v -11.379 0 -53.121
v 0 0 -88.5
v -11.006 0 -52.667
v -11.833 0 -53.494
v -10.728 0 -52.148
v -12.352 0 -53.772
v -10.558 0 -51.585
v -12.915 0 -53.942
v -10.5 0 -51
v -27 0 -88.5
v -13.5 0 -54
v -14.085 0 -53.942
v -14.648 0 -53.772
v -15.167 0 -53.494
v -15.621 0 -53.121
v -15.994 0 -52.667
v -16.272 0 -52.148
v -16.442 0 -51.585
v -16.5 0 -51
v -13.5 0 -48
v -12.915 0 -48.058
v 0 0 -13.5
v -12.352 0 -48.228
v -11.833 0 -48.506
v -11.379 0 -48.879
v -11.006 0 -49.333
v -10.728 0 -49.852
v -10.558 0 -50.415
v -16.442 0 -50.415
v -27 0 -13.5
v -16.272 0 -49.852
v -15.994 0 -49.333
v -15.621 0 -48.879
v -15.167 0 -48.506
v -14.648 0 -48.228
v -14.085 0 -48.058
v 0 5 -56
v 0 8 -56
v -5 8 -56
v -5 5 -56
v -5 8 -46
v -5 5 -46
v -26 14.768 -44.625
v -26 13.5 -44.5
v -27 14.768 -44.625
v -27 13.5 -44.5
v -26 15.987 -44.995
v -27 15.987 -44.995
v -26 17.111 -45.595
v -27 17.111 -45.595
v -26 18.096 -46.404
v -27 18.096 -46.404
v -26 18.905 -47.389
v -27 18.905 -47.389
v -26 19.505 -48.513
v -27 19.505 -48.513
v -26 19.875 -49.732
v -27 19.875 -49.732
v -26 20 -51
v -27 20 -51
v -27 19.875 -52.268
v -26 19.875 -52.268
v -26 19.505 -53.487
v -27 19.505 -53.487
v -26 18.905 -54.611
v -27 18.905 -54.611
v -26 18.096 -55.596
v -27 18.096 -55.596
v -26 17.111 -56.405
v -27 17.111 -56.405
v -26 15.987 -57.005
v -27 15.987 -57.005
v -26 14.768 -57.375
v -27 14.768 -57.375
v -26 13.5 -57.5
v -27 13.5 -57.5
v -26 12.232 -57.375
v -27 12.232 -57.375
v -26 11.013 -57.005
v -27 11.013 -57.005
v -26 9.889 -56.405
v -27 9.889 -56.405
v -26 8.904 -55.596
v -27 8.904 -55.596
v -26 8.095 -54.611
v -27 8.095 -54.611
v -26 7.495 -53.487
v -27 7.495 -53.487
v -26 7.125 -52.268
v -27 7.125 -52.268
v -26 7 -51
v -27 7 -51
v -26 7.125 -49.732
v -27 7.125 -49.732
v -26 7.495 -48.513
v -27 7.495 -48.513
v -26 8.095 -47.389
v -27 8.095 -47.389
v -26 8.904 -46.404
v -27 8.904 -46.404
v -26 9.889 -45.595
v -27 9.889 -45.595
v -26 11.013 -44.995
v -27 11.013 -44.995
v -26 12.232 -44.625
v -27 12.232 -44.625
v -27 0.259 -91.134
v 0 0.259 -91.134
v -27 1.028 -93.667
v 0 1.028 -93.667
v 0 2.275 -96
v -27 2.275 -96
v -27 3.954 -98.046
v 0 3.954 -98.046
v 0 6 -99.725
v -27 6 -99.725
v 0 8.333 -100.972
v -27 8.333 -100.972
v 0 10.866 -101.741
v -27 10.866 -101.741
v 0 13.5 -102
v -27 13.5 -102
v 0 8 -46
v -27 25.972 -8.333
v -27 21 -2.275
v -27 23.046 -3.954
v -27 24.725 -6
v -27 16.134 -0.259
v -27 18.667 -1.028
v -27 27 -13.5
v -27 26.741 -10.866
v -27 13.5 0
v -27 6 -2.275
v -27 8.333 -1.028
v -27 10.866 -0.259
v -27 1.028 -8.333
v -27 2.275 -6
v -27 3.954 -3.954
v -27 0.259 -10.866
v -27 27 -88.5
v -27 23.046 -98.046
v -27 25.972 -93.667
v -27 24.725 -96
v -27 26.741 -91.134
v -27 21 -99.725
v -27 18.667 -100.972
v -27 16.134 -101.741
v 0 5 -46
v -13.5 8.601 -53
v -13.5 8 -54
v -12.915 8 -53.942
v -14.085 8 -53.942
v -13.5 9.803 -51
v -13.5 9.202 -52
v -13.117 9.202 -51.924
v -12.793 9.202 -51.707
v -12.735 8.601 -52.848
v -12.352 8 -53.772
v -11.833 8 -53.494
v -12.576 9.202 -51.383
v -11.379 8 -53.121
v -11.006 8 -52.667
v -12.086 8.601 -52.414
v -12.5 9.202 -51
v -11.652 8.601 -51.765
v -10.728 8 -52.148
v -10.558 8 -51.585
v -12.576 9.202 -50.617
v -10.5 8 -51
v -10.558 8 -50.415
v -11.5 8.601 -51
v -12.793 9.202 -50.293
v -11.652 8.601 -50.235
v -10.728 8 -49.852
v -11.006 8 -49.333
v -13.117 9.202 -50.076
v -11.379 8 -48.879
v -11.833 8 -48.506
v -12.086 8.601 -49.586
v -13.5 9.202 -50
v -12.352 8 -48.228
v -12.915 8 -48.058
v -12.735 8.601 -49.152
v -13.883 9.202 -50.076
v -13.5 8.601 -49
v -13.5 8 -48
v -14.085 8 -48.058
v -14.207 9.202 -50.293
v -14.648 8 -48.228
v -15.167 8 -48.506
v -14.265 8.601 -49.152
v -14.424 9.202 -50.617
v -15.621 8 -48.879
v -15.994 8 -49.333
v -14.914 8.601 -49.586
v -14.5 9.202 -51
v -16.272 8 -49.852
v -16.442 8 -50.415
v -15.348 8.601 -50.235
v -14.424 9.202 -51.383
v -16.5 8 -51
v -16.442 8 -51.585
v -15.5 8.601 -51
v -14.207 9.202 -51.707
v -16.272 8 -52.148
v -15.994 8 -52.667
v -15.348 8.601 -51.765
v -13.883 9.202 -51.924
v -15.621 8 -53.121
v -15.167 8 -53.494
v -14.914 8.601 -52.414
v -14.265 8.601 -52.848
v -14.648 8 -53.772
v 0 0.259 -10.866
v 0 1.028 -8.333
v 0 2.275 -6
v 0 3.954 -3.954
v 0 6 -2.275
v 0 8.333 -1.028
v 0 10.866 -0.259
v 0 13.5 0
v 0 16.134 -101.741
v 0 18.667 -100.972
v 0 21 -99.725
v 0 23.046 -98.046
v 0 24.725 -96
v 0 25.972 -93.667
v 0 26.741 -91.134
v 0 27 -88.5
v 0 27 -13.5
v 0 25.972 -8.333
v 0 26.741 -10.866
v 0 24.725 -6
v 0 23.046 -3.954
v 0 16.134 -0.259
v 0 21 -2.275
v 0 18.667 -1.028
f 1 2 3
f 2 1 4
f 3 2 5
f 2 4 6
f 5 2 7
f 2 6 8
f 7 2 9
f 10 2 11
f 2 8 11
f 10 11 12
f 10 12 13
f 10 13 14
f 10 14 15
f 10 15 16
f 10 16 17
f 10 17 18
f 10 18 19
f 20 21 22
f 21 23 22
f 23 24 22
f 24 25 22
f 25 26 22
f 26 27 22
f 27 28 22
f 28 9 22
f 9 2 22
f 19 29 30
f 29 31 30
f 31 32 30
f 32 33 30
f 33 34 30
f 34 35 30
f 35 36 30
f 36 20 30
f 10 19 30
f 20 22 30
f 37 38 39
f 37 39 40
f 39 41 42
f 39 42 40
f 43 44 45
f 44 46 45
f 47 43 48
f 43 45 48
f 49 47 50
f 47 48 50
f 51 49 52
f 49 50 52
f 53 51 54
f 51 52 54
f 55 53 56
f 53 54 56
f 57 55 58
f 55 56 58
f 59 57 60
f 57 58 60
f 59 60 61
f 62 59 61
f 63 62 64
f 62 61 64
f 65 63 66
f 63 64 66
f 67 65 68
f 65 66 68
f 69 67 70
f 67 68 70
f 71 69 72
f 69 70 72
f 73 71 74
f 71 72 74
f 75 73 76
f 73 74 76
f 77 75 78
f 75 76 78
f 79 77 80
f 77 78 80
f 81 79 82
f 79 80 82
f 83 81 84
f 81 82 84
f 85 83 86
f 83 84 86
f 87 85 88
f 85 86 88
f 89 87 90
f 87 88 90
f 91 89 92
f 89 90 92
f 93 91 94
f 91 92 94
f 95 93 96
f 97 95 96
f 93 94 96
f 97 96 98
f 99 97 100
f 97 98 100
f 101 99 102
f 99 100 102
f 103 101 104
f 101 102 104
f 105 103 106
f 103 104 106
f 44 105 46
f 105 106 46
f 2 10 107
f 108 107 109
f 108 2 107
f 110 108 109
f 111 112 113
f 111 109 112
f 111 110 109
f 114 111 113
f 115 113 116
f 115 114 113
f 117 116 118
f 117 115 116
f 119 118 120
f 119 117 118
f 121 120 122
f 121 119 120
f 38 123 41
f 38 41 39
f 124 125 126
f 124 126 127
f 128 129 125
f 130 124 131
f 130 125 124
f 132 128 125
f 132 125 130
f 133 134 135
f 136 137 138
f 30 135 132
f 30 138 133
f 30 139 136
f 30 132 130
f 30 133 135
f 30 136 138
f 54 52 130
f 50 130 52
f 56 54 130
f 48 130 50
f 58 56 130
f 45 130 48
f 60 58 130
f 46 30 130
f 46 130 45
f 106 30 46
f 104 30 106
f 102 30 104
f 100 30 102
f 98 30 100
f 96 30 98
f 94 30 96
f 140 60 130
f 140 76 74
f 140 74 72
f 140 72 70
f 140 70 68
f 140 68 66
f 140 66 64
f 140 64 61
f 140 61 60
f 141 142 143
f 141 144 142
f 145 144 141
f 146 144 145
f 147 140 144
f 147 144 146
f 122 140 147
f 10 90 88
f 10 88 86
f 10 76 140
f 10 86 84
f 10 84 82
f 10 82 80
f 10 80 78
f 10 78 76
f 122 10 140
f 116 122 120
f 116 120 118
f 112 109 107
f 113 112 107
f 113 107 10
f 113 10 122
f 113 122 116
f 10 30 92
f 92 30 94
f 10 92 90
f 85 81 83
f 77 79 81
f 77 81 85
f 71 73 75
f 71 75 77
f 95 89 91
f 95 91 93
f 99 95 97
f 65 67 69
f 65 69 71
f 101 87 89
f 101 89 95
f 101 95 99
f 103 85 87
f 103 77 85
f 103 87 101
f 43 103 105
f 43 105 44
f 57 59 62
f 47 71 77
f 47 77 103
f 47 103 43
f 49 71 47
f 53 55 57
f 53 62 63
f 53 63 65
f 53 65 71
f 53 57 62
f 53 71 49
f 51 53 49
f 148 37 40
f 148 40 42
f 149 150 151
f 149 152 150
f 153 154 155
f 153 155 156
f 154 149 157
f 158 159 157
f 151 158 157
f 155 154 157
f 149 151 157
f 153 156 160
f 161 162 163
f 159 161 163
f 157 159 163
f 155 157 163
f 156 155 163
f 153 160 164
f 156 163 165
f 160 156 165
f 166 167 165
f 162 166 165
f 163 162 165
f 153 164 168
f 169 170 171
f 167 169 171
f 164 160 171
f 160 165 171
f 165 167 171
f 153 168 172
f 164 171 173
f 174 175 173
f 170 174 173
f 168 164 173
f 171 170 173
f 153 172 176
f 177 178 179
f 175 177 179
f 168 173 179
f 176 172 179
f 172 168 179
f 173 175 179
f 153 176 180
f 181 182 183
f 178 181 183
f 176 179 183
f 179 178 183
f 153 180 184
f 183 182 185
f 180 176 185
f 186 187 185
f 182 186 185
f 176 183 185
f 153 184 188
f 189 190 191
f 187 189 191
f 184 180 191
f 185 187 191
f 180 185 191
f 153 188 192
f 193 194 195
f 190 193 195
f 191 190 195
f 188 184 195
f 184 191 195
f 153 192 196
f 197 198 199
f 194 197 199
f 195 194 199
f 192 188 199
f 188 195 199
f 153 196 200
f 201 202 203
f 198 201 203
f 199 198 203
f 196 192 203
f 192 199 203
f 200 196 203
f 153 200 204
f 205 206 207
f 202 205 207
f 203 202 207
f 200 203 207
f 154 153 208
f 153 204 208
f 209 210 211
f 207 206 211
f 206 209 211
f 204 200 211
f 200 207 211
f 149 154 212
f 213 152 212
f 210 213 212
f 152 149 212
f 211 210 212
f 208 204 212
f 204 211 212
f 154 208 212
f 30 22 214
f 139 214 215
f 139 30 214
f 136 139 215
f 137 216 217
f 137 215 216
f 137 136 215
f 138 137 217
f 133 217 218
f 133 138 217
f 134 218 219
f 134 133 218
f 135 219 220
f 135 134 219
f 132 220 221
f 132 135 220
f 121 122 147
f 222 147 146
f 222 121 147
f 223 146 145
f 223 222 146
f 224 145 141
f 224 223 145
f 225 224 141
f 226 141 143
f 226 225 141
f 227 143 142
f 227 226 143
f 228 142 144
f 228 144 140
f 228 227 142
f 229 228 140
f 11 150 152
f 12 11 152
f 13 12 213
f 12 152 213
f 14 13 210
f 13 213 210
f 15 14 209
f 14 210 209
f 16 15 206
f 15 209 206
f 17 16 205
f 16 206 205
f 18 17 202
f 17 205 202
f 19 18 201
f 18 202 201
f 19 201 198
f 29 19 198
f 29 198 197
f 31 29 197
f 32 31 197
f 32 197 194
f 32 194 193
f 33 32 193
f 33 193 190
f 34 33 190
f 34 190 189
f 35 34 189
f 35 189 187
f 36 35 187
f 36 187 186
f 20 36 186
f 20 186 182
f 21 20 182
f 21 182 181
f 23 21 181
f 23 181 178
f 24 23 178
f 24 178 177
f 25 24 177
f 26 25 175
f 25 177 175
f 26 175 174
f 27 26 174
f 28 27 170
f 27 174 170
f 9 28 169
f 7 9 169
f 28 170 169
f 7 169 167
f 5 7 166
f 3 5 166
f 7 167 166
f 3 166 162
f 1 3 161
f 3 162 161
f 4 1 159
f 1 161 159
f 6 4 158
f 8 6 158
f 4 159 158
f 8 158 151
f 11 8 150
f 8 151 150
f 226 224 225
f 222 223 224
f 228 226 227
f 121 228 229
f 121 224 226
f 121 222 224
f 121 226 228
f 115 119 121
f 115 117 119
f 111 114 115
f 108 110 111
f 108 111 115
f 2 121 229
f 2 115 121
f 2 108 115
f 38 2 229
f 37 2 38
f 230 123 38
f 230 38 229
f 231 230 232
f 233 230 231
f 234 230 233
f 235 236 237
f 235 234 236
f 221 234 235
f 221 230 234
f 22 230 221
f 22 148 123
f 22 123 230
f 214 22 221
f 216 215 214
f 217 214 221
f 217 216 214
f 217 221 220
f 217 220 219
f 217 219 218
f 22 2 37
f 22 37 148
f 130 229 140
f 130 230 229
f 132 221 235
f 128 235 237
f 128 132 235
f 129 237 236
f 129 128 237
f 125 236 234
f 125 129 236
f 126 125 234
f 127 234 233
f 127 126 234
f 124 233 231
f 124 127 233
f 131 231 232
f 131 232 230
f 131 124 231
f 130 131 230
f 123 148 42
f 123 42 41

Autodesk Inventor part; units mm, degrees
ref_plane "YZ Plane" through (0, 0, 0) normal (1, 0, 0) x (0, 1, 0)
ref_plane "XZ Plane" through (0, 0, 0) normal (0, 1, 0) x (-1, 0, 0)
ref_plane "XY Plane" through (0, 0, 0) normal (0, 0, 1) x (1, 0, 0)
sketch "スケッチ1" plane through (0, 0, 0) normal (0, 1, 0) x (-1, 0, 0)
  line L0 (0, 0) -> (27, 0)
  line L1 (27, 0) -> (27, -102)
  line L2 (27, -102) -> (0, -102)
  line L3 (0, -102) -> (0, 0)
  dimension "d0" = 27
  dimension "d1" = 102
extrude "押し出し1" add sketch "スケッチ1" along normal blind 27
fillet "フィレット1" radius 13.5 4 edges at (-13.5, 27, 0) (-13.5, 0, 0) (-13.5, 27, -102) (-13.5, 0, -102)
sketch "スケッチ2" plane through (-27, 0, -88.5) normal (-1, 0, 0) x (0, 0, 1)
  line L0 (0, 27) -> (75, 27) projected
  line L1 (37.5, 27) -> (37.5, 0)
  line L2 (0, 0) -> (75, 0) projected
  circle A0 centre (37.5, 13.5) radius 6.5
  point P0 (88.5, 0)
  dimension "d5" = 13
extrude "押し出し2" cut sketch "スケッチ2" against normal blind 1
sketch "スケッチ3" plane through (0, 0, 0) normal (0, -1, 0) x (1, 0, 0)
  line L0 (-27, -88.5) -> (-27, -13.5) projected
  line L1 (-27, -51) -> (0, -51)
  line L2 (0, -13.5) -> (0, -88.5) projected
  point P0 (0, 0)
  point P1 (-13.5, -51)
hole "穴1" at (-13.5, 0, -51) direction (0, 1, 0) diameter 6 depth 8 tip angle 118
sketch "スケッチ4" plane through (0, 0, -13.5) normal (1, 0, 0) x (0, 0, -1)
  line L0 (32.5, 8) -> (42.5, 8)
  line L1 (42.5, 8) -> (42.5, 5)
  line L2 (42.5, 5) -> (32.5, 5)
  line L3 (32.5, 5) -> (32.5, 8)
  line L4 (0, 0) -> (75, 0) projected
  point P0 (-13.5, 0)
  point P1 (37.5, 0)
  point P2 (37.5, 5)
  dimension "d15" = 10
  dimension "d16" = 3
  dimension "d17" = 5
  dimension "d18" = 0
extrude "押し出し3" cut sketch "スケッチ4" against normal blind 5
properties part number "camera" material "ABS プラスチック"
